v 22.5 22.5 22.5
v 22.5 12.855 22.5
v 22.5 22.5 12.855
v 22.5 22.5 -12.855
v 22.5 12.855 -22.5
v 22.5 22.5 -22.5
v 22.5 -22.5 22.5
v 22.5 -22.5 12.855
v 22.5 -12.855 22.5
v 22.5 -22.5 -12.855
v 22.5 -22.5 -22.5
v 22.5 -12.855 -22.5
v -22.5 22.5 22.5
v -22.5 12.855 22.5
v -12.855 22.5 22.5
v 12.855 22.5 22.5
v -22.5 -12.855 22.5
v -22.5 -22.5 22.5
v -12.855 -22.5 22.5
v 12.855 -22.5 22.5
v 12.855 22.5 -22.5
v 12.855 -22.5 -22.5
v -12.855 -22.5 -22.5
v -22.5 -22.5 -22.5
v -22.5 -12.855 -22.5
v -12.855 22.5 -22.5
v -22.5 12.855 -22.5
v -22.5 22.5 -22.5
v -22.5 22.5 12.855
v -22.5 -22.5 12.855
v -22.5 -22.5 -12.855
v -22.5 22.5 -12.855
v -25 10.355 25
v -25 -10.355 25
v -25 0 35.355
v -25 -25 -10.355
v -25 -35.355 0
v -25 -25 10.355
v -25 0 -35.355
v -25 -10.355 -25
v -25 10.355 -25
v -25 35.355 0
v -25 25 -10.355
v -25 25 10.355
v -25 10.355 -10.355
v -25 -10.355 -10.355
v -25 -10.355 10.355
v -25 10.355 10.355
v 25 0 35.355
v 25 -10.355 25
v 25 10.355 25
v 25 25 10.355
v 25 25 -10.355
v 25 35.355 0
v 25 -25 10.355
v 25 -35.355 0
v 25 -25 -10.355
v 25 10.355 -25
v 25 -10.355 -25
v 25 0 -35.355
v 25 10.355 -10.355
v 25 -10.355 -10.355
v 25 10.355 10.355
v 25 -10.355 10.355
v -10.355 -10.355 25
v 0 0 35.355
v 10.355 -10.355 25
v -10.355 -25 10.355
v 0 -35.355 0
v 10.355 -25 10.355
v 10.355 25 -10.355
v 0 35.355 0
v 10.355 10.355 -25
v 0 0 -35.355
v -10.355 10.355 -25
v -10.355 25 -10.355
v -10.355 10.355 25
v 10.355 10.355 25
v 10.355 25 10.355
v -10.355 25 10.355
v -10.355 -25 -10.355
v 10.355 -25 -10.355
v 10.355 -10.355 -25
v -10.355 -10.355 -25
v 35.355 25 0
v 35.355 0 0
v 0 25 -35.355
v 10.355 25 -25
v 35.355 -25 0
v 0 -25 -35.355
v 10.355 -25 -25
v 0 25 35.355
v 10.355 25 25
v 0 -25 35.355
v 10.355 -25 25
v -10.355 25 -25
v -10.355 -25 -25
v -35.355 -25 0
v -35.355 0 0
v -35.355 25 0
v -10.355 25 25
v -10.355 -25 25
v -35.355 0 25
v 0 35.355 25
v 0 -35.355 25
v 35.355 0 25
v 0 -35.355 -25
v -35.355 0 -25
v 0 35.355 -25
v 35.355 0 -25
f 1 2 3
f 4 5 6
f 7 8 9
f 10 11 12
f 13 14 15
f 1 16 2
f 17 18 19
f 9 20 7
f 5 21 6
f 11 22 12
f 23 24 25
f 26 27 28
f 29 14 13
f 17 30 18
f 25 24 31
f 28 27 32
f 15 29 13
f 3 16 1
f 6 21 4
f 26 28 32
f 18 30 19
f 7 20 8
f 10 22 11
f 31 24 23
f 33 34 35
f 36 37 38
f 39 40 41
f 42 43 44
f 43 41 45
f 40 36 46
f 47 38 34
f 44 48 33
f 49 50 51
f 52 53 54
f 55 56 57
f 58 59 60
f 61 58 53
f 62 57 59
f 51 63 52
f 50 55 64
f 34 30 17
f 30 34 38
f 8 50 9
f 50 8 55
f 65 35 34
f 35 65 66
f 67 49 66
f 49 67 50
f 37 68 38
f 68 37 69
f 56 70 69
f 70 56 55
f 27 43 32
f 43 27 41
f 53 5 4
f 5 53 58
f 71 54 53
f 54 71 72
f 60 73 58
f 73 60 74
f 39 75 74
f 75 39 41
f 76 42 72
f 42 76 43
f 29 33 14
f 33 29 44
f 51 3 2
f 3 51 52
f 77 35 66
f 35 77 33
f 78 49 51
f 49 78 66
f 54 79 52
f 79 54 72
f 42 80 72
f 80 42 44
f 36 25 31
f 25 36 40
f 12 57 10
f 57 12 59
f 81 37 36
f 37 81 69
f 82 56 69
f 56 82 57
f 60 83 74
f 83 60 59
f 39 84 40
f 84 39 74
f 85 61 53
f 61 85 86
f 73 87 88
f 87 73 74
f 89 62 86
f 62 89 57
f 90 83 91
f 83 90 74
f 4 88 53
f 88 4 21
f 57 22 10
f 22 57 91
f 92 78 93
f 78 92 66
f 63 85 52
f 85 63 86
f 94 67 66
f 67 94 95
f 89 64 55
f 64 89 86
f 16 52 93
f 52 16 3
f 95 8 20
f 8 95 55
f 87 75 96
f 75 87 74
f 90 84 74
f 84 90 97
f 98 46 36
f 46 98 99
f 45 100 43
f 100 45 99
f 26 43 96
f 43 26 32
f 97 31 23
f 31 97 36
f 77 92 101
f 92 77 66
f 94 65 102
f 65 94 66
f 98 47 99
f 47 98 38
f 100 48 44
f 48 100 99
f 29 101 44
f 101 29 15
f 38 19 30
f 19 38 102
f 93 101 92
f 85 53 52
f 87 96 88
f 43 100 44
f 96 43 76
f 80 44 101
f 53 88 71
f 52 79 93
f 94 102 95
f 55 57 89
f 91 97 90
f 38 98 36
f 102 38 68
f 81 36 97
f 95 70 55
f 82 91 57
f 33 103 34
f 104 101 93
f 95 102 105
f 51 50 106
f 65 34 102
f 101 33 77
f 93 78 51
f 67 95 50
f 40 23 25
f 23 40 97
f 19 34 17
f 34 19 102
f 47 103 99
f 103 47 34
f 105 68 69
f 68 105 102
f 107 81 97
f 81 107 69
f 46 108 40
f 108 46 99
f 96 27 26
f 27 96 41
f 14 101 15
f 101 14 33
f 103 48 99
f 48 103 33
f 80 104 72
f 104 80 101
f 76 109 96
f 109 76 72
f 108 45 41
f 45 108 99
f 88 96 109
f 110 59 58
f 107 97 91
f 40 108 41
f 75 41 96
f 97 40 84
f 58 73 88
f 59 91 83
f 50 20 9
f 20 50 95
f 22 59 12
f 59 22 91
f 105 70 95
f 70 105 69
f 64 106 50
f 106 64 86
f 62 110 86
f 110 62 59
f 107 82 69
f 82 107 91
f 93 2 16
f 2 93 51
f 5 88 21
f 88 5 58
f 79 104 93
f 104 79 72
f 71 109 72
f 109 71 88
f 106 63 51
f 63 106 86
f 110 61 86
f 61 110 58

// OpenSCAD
cube(45, true);
rotate([45, 0, 0]) cube(50, true);
rotate([0, 45, 0]) cube(50, true);
rotate([0, 0, 45]) cube(50, true);
